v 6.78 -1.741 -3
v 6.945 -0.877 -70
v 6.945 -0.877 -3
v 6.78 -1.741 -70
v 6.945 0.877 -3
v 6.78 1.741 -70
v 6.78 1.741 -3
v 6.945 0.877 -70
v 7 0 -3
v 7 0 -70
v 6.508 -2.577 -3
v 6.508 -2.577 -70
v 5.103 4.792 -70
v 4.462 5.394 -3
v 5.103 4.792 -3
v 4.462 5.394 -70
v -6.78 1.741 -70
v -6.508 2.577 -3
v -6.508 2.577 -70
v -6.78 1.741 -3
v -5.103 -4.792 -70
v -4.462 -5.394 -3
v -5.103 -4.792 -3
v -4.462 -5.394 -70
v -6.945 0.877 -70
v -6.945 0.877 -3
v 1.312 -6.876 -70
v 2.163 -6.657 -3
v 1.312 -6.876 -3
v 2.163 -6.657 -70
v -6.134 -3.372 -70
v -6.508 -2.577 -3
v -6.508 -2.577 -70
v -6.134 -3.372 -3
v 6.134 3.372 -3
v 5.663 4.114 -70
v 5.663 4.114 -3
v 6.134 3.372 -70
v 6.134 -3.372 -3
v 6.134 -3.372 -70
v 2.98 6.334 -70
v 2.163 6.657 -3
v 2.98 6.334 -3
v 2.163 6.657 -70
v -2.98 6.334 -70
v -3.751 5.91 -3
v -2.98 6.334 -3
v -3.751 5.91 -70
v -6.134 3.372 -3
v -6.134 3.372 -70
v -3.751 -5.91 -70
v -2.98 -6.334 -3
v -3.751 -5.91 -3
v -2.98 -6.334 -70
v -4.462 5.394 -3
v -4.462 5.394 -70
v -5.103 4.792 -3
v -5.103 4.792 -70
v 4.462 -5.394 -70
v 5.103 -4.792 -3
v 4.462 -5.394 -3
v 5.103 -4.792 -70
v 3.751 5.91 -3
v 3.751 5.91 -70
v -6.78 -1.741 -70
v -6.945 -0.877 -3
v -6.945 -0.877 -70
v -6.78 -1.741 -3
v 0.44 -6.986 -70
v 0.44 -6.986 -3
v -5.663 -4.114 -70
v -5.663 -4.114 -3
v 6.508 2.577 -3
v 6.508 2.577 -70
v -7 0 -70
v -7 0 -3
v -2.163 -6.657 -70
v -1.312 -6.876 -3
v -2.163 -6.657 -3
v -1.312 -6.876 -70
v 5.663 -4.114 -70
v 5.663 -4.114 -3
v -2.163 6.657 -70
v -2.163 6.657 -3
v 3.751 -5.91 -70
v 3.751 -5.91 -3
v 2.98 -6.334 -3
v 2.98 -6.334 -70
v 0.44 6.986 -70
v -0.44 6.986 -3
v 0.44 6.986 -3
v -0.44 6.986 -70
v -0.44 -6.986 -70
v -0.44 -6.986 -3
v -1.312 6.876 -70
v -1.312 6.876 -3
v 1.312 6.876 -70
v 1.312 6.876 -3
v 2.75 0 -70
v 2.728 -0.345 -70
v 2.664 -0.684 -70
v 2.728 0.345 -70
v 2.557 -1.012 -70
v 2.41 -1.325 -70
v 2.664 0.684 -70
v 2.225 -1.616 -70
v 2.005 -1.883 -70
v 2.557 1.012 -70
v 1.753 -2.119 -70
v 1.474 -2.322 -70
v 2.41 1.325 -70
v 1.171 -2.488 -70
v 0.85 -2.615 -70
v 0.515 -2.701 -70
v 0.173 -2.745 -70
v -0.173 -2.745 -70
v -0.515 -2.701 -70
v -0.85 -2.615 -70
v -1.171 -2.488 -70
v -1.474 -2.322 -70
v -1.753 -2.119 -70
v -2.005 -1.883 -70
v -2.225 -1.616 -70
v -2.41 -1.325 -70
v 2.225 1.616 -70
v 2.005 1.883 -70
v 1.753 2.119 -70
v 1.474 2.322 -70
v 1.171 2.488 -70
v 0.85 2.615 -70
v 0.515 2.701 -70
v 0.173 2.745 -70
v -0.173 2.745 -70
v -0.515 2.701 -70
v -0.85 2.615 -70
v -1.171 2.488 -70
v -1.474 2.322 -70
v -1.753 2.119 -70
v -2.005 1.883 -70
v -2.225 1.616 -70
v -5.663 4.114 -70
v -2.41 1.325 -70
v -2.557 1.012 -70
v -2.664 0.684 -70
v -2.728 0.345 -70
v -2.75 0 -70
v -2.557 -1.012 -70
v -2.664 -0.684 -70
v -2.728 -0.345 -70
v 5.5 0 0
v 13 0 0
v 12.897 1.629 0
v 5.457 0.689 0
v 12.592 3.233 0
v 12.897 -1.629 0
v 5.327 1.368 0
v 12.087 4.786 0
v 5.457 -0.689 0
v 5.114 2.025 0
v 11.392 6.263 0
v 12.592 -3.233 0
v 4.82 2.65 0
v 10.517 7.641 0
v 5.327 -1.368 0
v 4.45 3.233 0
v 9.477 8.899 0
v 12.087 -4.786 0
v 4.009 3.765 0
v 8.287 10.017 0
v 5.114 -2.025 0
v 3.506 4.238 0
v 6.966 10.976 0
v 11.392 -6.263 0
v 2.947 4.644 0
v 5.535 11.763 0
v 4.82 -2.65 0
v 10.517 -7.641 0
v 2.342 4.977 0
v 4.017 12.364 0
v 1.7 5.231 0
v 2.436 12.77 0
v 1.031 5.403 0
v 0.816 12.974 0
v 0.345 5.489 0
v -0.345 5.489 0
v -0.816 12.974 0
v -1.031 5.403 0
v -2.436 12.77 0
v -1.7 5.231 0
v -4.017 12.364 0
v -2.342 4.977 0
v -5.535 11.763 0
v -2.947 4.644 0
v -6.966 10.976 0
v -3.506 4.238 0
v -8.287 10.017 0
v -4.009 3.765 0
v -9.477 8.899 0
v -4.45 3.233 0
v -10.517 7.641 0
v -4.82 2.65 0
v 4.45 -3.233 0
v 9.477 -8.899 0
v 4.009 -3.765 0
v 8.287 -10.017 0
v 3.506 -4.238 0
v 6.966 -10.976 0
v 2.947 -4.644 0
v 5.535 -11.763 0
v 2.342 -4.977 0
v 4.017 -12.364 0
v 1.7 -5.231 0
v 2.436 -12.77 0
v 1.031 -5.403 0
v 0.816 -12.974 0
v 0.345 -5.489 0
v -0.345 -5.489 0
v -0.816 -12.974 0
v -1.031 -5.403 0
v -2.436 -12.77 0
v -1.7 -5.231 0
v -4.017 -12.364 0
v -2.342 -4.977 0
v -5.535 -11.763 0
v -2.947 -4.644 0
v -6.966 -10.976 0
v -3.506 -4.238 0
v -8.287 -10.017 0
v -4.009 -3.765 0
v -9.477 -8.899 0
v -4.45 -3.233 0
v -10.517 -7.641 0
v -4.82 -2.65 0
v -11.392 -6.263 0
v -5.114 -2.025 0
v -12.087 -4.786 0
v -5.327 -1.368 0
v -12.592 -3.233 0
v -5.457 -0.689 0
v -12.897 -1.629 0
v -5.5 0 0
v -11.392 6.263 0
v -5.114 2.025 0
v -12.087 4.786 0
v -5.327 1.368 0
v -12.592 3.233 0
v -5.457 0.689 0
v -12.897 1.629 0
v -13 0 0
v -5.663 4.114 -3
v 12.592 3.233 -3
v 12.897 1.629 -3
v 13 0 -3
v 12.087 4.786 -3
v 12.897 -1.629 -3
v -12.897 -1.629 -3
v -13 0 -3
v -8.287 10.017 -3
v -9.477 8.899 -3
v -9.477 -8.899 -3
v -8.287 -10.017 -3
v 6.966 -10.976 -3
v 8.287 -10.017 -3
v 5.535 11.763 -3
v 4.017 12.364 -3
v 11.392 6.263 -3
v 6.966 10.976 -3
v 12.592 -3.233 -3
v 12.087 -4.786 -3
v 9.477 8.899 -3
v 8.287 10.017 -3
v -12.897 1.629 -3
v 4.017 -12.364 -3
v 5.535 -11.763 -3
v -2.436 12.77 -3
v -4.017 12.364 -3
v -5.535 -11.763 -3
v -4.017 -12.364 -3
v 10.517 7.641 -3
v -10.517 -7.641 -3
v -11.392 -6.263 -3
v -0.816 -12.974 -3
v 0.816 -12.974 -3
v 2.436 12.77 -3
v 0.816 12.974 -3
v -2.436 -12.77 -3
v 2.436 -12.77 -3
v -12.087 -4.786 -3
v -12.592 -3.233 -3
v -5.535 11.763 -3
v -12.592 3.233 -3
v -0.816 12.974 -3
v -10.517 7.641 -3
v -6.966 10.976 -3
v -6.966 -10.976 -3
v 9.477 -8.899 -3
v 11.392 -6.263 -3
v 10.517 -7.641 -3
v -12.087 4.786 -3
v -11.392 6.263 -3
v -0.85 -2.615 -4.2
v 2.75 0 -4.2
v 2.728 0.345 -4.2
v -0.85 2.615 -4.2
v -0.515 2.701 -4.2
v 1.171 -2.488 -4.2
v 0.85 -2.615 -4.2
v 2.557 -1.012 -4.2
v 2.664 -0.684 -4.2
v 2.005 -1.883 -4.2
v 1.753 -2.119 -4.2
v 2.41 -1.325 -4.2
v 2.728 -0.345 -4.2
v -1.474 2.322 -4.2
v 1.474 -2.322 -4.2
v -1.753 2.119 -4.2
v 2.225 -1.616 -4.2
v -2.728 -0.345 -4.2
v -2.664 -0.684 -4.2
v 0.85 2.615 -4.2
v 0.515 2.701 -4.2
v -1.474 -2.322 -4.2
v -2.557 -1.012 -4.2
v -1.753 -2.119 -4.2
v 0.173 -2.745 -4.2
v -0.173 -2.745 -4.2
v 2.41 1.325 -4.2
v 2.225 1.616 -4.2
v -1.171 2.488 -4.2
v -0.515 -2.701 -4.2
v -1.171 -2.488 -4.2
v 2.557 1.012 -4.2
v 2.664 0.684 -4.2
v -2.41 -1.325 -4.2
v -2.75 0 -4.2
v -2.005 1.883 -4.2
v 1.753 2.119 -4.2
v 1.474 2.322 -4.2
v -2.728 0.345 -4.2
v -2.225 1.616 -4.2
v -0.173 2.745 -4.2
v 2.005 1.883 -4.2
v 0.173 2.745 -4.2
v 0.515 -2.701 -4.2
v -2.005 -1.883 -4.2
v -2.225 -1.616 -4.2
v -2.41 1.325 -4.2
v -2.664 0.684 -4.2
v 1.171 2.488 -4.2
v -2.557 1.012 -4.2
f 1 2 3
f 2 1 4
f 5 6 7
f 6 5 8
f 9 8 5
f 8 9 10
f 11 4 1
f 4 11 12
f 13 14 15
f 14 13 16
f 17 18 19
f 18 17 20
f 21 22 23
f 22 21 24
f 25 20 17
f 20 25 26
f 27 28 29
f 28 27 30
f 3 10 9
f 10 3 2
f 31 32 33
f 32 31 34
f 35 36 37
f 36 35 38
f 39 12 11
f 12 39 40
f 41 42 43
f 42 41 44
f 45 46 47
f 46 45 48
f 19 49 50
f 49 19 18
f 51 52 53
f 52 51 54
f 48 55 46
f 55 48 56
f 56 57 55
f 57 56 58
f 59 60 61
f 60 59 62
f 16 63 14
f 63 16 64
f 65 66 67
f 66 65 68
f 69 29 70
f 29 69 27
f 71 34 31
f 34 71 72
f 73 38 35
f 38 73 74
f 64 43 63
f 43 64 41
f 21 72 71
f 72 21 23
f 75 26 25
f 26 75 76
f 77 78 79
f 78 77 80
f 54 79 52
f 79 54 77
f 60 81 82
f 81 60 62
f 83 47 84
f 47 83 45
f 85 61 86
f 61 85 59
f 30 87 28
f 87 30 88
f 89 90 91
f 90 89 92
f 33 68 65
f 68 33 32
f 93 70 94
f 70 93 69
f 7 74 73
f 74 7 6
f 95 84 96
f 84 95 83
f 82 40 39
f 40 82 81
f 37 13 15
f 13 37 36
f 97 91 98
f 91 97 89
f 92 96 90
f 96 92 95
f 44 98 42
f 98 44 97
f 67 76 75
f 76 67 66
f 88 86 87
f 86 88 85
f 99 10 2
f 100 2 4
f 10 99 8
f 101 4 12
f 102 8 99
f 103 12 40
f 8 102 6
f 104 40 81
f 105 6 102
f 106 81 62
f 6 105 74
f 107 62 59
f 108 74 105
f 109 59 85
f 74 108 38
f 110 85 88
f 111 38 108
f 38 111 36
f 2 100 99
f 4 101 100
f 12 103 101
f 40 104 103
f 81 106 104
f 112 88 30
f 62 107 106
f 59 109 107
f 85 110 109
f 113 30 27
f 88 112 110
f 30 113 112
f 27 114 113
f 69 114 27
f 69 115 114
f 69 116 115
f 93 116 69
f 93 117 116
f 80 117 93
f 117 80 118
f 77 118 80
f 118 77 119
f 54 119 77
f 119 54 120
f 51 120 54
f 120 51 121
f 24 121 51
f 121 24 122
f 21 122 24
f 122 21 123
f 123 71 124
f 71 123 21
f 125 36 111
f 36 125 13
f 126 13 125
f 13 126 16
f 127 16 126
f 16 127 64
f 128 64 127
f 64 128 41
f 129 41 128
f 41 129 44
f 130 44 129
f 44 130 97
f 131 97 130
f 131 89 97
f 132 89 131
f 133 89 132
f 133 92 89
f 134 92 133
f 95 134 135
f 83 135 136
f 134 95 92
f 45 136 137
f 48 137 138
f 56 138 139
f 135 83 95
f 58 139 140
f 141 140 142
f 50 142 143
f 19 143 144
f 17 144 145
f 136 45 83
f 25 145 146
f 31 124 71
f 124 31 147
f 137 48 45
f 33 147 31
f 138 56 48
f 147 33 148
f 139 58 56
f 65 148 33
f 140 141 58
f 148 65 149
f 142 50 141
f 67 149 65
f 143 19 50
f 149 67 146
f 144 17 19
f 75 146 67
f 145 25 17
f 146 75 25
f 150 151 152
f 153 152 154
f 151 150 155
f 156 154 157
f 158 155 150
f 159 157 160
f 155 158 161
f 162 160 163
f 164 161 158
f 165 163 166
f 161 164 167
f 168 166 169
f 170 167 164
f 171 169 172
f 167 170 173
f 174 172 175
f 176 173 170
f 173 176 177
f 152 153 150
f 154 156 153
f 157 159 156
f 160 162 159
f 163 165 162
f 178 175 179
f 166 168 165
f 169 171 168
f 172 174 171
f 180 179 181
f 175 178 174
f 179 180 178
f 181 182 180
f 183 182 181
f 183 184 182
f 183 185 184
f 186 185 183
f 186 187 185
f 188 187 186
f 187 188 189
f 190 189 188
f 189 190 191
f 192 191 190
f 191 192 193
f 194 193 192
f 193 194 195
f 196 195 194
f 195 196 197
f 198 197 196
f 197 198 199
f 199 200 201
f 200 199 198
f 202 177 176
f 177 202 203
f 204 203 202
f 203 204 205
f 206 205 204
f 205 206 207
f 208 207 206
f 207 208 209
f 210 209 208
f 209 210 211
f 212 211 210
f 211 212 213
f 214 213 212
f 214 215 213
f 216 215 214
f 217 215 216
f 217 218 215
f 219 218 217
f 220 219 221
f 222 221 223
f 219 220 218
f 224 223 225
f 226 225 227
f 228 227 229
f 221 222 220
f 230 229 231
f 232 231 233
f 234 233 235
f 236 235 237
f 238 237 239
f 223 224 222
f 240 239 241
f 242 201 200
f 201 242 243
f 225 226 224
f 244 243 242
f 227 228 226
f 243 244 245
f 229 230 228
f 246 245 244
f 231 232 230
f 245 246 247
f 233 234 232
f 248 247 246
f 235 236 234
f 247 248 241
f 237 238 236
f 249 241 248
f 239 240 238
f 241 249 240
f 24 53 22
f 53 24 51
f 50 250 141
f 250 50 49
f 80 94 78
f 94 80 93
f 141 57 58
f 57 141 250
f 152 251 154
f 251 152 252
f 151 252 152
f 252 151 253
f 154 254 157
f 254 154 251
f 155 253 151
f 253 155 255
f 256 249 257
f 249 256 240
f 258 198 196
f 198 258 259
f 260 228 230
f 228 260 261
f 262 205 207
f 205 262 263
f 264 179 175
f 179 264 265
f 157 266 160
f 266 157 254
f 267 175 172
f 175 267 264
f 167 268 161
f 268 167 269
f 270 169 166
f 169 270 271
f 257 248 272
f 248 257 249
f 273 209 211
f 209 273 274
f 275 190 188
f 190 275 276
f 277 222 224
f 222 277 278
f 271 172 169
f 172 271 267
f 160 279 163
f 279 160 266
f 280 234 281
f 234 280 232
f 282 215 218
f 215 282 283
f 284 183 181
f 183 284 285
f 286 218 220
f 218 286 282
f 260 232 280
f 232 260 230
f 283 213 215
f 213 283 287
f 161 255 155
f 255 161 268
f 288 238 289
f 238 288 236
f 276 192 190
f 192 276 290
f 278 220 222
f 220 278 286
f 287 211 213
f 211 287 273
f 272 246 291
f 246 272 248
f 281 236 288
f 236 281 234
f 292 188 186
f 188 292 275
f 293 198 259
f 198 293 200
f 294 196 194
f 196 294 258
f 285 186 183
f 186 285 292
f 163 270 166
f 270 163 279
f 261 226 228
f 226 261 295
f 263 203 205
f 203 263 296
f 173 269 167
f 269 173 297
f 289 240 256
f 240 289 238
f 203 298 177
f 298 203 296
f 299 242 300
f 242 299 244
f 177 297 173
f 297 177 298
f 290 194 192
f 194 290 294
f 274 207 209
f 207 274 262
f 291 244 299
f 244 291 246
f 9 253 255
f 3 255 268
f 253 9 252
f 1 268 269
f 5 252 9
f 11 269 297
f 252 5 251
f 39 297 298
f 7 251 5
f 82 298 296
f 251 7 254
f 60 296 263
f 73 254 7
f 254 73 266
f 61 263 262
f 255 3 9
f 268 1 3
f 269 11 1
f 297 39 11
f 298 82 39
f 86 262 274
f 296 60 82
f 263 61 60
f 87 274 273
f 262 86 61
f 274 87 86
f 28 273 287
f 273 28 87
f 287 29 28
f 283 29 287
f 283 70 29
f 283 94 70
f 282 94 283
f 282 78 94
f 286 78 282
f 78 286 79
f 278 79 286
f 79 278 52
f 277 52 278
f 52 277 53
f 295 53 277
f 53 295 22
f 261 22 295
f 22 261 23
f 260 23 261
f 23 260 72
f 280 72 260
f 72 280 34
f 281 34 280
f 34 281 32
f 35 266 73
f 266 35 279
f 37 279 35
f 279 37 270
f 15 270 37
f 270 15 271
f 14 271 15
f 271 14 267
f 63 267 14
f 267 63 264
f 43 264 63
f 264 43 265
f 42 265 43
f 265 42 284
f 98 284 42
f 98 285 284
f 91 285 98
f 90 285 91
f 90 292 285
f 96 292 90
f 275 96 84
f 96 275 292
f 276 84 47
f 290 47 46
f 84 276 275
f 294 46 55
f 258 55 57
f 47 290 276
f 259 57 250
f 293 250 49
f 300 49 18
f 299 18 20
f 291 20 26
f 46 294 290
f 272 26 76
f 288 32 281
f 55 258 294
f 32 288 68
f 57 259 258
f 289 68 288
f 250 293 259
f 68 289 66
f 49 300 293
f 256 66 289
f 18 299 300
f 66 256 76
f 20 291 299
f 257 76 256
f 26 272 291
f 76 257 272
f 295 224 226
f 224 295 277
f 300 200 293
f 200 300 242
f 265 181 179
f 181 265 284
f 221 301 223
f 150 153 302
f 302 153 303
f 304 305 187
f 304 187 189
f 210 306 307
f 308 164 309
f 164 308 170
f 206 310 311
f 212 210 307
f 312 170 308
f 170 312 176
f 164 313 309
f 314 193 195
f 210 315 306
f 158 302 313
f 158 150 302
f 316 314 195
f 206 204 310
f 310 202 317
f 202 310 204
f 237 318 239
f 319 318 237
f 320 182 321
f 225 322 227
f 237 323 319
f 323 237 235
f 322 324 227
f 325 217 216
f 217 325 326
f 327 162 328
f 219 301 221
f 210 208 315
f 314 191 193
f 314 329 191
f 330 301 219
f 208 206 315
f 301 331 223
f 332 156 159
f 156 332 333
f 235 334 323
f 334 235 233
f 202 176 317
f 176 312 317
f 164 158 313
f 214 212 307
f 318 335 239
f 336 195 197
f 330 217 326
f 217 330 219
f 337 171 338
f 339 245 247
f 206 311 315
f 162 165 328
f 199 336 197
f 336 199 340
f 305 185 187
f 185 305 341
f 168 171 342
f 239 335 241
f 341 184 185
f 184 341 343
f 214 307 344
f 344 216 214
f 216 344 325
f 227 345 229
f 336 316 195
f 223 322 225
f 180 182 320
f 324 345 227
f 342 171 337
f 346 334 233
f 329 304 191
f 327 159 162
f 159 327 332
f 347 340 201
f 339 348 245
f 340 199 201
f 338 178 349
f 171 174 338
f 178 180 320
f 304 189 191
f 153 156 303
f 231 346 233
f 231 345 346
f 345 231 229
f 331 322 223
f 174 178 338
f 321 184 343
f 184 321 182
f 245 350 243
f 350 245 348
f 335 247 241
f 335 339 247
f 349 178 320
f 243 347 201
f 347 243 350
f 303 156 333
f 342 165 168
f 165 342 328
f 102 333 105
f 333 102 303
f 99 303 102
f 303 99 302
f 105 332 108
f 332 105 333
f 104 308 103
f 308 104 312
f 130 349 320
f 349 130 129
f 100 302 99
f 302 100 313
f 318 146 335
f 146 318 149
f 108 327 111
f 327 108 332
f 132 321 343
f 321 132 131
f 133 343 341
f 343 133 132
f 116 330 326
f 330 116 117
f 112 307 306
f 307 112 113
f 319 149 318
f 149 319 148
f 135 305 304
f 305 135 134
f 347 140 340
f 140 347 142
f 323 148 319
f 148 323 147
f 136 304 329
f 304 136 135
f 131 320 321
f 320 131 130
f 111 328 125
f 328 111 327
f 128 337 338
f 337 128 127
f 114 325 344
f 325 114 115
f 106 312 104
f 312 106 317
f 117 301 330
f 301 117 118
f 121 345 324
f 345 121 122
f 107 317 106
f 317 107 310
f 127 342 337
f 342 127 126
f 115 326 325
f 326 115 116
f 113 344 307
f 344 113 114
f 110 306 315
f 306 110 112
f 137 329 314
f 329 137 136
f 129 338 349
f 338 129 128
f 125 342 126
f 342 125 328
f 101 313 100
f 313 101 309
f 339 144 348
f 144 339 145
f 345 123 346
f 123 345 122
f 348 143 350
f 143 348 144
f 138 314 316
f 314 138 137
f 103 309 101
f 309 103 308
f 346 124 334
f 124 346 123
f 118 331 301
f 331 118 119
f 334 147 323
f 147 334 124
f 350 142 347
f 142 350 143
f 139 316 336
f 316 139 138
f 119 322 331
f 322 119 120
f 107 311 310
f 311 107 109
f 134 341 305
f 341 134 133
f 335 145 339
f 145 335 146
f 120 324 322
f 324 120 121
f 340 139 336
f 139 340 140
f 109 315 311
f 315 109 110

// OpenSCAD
$fn = 50;


difference() {
	union() {
		translate(v = [0, 0, -70.0000000000]) {
			cylinder(h = 70, r = 7.0000000000);
		}
		translate(v = [0, 0, -3.0000000000]) {
			cylinder(h = 3, r = 13.0000000000);
		}
	}
	union() {
		translate(v = [0, 0, 0]) {
			rotate(a = [0, 0, 0]) {
				difference() {
					union() {
						#translate(v = [0, 0, -70.0000000000]) {
							cylinder(h = 70, r = 2.2500000000);
						}
						#translate(v = [0, 0, -4.2000000000]) {
							cylinder(h = 4.2000000000, r = 7.0000000000, r1 = 2.7500000000, r2 = 5.5000000000);
						}
						#translate(v = [0, 0, -70.0000000000]) {
							cylinder(h = 70, r = 2.7500000000);
						}
						#translate(v = [0, 0, -70.0000000000]) {
							cylinder(h = 70, r = 2.2500000000);
						}
					}
					union();
				}
			}
		}
	}
}
